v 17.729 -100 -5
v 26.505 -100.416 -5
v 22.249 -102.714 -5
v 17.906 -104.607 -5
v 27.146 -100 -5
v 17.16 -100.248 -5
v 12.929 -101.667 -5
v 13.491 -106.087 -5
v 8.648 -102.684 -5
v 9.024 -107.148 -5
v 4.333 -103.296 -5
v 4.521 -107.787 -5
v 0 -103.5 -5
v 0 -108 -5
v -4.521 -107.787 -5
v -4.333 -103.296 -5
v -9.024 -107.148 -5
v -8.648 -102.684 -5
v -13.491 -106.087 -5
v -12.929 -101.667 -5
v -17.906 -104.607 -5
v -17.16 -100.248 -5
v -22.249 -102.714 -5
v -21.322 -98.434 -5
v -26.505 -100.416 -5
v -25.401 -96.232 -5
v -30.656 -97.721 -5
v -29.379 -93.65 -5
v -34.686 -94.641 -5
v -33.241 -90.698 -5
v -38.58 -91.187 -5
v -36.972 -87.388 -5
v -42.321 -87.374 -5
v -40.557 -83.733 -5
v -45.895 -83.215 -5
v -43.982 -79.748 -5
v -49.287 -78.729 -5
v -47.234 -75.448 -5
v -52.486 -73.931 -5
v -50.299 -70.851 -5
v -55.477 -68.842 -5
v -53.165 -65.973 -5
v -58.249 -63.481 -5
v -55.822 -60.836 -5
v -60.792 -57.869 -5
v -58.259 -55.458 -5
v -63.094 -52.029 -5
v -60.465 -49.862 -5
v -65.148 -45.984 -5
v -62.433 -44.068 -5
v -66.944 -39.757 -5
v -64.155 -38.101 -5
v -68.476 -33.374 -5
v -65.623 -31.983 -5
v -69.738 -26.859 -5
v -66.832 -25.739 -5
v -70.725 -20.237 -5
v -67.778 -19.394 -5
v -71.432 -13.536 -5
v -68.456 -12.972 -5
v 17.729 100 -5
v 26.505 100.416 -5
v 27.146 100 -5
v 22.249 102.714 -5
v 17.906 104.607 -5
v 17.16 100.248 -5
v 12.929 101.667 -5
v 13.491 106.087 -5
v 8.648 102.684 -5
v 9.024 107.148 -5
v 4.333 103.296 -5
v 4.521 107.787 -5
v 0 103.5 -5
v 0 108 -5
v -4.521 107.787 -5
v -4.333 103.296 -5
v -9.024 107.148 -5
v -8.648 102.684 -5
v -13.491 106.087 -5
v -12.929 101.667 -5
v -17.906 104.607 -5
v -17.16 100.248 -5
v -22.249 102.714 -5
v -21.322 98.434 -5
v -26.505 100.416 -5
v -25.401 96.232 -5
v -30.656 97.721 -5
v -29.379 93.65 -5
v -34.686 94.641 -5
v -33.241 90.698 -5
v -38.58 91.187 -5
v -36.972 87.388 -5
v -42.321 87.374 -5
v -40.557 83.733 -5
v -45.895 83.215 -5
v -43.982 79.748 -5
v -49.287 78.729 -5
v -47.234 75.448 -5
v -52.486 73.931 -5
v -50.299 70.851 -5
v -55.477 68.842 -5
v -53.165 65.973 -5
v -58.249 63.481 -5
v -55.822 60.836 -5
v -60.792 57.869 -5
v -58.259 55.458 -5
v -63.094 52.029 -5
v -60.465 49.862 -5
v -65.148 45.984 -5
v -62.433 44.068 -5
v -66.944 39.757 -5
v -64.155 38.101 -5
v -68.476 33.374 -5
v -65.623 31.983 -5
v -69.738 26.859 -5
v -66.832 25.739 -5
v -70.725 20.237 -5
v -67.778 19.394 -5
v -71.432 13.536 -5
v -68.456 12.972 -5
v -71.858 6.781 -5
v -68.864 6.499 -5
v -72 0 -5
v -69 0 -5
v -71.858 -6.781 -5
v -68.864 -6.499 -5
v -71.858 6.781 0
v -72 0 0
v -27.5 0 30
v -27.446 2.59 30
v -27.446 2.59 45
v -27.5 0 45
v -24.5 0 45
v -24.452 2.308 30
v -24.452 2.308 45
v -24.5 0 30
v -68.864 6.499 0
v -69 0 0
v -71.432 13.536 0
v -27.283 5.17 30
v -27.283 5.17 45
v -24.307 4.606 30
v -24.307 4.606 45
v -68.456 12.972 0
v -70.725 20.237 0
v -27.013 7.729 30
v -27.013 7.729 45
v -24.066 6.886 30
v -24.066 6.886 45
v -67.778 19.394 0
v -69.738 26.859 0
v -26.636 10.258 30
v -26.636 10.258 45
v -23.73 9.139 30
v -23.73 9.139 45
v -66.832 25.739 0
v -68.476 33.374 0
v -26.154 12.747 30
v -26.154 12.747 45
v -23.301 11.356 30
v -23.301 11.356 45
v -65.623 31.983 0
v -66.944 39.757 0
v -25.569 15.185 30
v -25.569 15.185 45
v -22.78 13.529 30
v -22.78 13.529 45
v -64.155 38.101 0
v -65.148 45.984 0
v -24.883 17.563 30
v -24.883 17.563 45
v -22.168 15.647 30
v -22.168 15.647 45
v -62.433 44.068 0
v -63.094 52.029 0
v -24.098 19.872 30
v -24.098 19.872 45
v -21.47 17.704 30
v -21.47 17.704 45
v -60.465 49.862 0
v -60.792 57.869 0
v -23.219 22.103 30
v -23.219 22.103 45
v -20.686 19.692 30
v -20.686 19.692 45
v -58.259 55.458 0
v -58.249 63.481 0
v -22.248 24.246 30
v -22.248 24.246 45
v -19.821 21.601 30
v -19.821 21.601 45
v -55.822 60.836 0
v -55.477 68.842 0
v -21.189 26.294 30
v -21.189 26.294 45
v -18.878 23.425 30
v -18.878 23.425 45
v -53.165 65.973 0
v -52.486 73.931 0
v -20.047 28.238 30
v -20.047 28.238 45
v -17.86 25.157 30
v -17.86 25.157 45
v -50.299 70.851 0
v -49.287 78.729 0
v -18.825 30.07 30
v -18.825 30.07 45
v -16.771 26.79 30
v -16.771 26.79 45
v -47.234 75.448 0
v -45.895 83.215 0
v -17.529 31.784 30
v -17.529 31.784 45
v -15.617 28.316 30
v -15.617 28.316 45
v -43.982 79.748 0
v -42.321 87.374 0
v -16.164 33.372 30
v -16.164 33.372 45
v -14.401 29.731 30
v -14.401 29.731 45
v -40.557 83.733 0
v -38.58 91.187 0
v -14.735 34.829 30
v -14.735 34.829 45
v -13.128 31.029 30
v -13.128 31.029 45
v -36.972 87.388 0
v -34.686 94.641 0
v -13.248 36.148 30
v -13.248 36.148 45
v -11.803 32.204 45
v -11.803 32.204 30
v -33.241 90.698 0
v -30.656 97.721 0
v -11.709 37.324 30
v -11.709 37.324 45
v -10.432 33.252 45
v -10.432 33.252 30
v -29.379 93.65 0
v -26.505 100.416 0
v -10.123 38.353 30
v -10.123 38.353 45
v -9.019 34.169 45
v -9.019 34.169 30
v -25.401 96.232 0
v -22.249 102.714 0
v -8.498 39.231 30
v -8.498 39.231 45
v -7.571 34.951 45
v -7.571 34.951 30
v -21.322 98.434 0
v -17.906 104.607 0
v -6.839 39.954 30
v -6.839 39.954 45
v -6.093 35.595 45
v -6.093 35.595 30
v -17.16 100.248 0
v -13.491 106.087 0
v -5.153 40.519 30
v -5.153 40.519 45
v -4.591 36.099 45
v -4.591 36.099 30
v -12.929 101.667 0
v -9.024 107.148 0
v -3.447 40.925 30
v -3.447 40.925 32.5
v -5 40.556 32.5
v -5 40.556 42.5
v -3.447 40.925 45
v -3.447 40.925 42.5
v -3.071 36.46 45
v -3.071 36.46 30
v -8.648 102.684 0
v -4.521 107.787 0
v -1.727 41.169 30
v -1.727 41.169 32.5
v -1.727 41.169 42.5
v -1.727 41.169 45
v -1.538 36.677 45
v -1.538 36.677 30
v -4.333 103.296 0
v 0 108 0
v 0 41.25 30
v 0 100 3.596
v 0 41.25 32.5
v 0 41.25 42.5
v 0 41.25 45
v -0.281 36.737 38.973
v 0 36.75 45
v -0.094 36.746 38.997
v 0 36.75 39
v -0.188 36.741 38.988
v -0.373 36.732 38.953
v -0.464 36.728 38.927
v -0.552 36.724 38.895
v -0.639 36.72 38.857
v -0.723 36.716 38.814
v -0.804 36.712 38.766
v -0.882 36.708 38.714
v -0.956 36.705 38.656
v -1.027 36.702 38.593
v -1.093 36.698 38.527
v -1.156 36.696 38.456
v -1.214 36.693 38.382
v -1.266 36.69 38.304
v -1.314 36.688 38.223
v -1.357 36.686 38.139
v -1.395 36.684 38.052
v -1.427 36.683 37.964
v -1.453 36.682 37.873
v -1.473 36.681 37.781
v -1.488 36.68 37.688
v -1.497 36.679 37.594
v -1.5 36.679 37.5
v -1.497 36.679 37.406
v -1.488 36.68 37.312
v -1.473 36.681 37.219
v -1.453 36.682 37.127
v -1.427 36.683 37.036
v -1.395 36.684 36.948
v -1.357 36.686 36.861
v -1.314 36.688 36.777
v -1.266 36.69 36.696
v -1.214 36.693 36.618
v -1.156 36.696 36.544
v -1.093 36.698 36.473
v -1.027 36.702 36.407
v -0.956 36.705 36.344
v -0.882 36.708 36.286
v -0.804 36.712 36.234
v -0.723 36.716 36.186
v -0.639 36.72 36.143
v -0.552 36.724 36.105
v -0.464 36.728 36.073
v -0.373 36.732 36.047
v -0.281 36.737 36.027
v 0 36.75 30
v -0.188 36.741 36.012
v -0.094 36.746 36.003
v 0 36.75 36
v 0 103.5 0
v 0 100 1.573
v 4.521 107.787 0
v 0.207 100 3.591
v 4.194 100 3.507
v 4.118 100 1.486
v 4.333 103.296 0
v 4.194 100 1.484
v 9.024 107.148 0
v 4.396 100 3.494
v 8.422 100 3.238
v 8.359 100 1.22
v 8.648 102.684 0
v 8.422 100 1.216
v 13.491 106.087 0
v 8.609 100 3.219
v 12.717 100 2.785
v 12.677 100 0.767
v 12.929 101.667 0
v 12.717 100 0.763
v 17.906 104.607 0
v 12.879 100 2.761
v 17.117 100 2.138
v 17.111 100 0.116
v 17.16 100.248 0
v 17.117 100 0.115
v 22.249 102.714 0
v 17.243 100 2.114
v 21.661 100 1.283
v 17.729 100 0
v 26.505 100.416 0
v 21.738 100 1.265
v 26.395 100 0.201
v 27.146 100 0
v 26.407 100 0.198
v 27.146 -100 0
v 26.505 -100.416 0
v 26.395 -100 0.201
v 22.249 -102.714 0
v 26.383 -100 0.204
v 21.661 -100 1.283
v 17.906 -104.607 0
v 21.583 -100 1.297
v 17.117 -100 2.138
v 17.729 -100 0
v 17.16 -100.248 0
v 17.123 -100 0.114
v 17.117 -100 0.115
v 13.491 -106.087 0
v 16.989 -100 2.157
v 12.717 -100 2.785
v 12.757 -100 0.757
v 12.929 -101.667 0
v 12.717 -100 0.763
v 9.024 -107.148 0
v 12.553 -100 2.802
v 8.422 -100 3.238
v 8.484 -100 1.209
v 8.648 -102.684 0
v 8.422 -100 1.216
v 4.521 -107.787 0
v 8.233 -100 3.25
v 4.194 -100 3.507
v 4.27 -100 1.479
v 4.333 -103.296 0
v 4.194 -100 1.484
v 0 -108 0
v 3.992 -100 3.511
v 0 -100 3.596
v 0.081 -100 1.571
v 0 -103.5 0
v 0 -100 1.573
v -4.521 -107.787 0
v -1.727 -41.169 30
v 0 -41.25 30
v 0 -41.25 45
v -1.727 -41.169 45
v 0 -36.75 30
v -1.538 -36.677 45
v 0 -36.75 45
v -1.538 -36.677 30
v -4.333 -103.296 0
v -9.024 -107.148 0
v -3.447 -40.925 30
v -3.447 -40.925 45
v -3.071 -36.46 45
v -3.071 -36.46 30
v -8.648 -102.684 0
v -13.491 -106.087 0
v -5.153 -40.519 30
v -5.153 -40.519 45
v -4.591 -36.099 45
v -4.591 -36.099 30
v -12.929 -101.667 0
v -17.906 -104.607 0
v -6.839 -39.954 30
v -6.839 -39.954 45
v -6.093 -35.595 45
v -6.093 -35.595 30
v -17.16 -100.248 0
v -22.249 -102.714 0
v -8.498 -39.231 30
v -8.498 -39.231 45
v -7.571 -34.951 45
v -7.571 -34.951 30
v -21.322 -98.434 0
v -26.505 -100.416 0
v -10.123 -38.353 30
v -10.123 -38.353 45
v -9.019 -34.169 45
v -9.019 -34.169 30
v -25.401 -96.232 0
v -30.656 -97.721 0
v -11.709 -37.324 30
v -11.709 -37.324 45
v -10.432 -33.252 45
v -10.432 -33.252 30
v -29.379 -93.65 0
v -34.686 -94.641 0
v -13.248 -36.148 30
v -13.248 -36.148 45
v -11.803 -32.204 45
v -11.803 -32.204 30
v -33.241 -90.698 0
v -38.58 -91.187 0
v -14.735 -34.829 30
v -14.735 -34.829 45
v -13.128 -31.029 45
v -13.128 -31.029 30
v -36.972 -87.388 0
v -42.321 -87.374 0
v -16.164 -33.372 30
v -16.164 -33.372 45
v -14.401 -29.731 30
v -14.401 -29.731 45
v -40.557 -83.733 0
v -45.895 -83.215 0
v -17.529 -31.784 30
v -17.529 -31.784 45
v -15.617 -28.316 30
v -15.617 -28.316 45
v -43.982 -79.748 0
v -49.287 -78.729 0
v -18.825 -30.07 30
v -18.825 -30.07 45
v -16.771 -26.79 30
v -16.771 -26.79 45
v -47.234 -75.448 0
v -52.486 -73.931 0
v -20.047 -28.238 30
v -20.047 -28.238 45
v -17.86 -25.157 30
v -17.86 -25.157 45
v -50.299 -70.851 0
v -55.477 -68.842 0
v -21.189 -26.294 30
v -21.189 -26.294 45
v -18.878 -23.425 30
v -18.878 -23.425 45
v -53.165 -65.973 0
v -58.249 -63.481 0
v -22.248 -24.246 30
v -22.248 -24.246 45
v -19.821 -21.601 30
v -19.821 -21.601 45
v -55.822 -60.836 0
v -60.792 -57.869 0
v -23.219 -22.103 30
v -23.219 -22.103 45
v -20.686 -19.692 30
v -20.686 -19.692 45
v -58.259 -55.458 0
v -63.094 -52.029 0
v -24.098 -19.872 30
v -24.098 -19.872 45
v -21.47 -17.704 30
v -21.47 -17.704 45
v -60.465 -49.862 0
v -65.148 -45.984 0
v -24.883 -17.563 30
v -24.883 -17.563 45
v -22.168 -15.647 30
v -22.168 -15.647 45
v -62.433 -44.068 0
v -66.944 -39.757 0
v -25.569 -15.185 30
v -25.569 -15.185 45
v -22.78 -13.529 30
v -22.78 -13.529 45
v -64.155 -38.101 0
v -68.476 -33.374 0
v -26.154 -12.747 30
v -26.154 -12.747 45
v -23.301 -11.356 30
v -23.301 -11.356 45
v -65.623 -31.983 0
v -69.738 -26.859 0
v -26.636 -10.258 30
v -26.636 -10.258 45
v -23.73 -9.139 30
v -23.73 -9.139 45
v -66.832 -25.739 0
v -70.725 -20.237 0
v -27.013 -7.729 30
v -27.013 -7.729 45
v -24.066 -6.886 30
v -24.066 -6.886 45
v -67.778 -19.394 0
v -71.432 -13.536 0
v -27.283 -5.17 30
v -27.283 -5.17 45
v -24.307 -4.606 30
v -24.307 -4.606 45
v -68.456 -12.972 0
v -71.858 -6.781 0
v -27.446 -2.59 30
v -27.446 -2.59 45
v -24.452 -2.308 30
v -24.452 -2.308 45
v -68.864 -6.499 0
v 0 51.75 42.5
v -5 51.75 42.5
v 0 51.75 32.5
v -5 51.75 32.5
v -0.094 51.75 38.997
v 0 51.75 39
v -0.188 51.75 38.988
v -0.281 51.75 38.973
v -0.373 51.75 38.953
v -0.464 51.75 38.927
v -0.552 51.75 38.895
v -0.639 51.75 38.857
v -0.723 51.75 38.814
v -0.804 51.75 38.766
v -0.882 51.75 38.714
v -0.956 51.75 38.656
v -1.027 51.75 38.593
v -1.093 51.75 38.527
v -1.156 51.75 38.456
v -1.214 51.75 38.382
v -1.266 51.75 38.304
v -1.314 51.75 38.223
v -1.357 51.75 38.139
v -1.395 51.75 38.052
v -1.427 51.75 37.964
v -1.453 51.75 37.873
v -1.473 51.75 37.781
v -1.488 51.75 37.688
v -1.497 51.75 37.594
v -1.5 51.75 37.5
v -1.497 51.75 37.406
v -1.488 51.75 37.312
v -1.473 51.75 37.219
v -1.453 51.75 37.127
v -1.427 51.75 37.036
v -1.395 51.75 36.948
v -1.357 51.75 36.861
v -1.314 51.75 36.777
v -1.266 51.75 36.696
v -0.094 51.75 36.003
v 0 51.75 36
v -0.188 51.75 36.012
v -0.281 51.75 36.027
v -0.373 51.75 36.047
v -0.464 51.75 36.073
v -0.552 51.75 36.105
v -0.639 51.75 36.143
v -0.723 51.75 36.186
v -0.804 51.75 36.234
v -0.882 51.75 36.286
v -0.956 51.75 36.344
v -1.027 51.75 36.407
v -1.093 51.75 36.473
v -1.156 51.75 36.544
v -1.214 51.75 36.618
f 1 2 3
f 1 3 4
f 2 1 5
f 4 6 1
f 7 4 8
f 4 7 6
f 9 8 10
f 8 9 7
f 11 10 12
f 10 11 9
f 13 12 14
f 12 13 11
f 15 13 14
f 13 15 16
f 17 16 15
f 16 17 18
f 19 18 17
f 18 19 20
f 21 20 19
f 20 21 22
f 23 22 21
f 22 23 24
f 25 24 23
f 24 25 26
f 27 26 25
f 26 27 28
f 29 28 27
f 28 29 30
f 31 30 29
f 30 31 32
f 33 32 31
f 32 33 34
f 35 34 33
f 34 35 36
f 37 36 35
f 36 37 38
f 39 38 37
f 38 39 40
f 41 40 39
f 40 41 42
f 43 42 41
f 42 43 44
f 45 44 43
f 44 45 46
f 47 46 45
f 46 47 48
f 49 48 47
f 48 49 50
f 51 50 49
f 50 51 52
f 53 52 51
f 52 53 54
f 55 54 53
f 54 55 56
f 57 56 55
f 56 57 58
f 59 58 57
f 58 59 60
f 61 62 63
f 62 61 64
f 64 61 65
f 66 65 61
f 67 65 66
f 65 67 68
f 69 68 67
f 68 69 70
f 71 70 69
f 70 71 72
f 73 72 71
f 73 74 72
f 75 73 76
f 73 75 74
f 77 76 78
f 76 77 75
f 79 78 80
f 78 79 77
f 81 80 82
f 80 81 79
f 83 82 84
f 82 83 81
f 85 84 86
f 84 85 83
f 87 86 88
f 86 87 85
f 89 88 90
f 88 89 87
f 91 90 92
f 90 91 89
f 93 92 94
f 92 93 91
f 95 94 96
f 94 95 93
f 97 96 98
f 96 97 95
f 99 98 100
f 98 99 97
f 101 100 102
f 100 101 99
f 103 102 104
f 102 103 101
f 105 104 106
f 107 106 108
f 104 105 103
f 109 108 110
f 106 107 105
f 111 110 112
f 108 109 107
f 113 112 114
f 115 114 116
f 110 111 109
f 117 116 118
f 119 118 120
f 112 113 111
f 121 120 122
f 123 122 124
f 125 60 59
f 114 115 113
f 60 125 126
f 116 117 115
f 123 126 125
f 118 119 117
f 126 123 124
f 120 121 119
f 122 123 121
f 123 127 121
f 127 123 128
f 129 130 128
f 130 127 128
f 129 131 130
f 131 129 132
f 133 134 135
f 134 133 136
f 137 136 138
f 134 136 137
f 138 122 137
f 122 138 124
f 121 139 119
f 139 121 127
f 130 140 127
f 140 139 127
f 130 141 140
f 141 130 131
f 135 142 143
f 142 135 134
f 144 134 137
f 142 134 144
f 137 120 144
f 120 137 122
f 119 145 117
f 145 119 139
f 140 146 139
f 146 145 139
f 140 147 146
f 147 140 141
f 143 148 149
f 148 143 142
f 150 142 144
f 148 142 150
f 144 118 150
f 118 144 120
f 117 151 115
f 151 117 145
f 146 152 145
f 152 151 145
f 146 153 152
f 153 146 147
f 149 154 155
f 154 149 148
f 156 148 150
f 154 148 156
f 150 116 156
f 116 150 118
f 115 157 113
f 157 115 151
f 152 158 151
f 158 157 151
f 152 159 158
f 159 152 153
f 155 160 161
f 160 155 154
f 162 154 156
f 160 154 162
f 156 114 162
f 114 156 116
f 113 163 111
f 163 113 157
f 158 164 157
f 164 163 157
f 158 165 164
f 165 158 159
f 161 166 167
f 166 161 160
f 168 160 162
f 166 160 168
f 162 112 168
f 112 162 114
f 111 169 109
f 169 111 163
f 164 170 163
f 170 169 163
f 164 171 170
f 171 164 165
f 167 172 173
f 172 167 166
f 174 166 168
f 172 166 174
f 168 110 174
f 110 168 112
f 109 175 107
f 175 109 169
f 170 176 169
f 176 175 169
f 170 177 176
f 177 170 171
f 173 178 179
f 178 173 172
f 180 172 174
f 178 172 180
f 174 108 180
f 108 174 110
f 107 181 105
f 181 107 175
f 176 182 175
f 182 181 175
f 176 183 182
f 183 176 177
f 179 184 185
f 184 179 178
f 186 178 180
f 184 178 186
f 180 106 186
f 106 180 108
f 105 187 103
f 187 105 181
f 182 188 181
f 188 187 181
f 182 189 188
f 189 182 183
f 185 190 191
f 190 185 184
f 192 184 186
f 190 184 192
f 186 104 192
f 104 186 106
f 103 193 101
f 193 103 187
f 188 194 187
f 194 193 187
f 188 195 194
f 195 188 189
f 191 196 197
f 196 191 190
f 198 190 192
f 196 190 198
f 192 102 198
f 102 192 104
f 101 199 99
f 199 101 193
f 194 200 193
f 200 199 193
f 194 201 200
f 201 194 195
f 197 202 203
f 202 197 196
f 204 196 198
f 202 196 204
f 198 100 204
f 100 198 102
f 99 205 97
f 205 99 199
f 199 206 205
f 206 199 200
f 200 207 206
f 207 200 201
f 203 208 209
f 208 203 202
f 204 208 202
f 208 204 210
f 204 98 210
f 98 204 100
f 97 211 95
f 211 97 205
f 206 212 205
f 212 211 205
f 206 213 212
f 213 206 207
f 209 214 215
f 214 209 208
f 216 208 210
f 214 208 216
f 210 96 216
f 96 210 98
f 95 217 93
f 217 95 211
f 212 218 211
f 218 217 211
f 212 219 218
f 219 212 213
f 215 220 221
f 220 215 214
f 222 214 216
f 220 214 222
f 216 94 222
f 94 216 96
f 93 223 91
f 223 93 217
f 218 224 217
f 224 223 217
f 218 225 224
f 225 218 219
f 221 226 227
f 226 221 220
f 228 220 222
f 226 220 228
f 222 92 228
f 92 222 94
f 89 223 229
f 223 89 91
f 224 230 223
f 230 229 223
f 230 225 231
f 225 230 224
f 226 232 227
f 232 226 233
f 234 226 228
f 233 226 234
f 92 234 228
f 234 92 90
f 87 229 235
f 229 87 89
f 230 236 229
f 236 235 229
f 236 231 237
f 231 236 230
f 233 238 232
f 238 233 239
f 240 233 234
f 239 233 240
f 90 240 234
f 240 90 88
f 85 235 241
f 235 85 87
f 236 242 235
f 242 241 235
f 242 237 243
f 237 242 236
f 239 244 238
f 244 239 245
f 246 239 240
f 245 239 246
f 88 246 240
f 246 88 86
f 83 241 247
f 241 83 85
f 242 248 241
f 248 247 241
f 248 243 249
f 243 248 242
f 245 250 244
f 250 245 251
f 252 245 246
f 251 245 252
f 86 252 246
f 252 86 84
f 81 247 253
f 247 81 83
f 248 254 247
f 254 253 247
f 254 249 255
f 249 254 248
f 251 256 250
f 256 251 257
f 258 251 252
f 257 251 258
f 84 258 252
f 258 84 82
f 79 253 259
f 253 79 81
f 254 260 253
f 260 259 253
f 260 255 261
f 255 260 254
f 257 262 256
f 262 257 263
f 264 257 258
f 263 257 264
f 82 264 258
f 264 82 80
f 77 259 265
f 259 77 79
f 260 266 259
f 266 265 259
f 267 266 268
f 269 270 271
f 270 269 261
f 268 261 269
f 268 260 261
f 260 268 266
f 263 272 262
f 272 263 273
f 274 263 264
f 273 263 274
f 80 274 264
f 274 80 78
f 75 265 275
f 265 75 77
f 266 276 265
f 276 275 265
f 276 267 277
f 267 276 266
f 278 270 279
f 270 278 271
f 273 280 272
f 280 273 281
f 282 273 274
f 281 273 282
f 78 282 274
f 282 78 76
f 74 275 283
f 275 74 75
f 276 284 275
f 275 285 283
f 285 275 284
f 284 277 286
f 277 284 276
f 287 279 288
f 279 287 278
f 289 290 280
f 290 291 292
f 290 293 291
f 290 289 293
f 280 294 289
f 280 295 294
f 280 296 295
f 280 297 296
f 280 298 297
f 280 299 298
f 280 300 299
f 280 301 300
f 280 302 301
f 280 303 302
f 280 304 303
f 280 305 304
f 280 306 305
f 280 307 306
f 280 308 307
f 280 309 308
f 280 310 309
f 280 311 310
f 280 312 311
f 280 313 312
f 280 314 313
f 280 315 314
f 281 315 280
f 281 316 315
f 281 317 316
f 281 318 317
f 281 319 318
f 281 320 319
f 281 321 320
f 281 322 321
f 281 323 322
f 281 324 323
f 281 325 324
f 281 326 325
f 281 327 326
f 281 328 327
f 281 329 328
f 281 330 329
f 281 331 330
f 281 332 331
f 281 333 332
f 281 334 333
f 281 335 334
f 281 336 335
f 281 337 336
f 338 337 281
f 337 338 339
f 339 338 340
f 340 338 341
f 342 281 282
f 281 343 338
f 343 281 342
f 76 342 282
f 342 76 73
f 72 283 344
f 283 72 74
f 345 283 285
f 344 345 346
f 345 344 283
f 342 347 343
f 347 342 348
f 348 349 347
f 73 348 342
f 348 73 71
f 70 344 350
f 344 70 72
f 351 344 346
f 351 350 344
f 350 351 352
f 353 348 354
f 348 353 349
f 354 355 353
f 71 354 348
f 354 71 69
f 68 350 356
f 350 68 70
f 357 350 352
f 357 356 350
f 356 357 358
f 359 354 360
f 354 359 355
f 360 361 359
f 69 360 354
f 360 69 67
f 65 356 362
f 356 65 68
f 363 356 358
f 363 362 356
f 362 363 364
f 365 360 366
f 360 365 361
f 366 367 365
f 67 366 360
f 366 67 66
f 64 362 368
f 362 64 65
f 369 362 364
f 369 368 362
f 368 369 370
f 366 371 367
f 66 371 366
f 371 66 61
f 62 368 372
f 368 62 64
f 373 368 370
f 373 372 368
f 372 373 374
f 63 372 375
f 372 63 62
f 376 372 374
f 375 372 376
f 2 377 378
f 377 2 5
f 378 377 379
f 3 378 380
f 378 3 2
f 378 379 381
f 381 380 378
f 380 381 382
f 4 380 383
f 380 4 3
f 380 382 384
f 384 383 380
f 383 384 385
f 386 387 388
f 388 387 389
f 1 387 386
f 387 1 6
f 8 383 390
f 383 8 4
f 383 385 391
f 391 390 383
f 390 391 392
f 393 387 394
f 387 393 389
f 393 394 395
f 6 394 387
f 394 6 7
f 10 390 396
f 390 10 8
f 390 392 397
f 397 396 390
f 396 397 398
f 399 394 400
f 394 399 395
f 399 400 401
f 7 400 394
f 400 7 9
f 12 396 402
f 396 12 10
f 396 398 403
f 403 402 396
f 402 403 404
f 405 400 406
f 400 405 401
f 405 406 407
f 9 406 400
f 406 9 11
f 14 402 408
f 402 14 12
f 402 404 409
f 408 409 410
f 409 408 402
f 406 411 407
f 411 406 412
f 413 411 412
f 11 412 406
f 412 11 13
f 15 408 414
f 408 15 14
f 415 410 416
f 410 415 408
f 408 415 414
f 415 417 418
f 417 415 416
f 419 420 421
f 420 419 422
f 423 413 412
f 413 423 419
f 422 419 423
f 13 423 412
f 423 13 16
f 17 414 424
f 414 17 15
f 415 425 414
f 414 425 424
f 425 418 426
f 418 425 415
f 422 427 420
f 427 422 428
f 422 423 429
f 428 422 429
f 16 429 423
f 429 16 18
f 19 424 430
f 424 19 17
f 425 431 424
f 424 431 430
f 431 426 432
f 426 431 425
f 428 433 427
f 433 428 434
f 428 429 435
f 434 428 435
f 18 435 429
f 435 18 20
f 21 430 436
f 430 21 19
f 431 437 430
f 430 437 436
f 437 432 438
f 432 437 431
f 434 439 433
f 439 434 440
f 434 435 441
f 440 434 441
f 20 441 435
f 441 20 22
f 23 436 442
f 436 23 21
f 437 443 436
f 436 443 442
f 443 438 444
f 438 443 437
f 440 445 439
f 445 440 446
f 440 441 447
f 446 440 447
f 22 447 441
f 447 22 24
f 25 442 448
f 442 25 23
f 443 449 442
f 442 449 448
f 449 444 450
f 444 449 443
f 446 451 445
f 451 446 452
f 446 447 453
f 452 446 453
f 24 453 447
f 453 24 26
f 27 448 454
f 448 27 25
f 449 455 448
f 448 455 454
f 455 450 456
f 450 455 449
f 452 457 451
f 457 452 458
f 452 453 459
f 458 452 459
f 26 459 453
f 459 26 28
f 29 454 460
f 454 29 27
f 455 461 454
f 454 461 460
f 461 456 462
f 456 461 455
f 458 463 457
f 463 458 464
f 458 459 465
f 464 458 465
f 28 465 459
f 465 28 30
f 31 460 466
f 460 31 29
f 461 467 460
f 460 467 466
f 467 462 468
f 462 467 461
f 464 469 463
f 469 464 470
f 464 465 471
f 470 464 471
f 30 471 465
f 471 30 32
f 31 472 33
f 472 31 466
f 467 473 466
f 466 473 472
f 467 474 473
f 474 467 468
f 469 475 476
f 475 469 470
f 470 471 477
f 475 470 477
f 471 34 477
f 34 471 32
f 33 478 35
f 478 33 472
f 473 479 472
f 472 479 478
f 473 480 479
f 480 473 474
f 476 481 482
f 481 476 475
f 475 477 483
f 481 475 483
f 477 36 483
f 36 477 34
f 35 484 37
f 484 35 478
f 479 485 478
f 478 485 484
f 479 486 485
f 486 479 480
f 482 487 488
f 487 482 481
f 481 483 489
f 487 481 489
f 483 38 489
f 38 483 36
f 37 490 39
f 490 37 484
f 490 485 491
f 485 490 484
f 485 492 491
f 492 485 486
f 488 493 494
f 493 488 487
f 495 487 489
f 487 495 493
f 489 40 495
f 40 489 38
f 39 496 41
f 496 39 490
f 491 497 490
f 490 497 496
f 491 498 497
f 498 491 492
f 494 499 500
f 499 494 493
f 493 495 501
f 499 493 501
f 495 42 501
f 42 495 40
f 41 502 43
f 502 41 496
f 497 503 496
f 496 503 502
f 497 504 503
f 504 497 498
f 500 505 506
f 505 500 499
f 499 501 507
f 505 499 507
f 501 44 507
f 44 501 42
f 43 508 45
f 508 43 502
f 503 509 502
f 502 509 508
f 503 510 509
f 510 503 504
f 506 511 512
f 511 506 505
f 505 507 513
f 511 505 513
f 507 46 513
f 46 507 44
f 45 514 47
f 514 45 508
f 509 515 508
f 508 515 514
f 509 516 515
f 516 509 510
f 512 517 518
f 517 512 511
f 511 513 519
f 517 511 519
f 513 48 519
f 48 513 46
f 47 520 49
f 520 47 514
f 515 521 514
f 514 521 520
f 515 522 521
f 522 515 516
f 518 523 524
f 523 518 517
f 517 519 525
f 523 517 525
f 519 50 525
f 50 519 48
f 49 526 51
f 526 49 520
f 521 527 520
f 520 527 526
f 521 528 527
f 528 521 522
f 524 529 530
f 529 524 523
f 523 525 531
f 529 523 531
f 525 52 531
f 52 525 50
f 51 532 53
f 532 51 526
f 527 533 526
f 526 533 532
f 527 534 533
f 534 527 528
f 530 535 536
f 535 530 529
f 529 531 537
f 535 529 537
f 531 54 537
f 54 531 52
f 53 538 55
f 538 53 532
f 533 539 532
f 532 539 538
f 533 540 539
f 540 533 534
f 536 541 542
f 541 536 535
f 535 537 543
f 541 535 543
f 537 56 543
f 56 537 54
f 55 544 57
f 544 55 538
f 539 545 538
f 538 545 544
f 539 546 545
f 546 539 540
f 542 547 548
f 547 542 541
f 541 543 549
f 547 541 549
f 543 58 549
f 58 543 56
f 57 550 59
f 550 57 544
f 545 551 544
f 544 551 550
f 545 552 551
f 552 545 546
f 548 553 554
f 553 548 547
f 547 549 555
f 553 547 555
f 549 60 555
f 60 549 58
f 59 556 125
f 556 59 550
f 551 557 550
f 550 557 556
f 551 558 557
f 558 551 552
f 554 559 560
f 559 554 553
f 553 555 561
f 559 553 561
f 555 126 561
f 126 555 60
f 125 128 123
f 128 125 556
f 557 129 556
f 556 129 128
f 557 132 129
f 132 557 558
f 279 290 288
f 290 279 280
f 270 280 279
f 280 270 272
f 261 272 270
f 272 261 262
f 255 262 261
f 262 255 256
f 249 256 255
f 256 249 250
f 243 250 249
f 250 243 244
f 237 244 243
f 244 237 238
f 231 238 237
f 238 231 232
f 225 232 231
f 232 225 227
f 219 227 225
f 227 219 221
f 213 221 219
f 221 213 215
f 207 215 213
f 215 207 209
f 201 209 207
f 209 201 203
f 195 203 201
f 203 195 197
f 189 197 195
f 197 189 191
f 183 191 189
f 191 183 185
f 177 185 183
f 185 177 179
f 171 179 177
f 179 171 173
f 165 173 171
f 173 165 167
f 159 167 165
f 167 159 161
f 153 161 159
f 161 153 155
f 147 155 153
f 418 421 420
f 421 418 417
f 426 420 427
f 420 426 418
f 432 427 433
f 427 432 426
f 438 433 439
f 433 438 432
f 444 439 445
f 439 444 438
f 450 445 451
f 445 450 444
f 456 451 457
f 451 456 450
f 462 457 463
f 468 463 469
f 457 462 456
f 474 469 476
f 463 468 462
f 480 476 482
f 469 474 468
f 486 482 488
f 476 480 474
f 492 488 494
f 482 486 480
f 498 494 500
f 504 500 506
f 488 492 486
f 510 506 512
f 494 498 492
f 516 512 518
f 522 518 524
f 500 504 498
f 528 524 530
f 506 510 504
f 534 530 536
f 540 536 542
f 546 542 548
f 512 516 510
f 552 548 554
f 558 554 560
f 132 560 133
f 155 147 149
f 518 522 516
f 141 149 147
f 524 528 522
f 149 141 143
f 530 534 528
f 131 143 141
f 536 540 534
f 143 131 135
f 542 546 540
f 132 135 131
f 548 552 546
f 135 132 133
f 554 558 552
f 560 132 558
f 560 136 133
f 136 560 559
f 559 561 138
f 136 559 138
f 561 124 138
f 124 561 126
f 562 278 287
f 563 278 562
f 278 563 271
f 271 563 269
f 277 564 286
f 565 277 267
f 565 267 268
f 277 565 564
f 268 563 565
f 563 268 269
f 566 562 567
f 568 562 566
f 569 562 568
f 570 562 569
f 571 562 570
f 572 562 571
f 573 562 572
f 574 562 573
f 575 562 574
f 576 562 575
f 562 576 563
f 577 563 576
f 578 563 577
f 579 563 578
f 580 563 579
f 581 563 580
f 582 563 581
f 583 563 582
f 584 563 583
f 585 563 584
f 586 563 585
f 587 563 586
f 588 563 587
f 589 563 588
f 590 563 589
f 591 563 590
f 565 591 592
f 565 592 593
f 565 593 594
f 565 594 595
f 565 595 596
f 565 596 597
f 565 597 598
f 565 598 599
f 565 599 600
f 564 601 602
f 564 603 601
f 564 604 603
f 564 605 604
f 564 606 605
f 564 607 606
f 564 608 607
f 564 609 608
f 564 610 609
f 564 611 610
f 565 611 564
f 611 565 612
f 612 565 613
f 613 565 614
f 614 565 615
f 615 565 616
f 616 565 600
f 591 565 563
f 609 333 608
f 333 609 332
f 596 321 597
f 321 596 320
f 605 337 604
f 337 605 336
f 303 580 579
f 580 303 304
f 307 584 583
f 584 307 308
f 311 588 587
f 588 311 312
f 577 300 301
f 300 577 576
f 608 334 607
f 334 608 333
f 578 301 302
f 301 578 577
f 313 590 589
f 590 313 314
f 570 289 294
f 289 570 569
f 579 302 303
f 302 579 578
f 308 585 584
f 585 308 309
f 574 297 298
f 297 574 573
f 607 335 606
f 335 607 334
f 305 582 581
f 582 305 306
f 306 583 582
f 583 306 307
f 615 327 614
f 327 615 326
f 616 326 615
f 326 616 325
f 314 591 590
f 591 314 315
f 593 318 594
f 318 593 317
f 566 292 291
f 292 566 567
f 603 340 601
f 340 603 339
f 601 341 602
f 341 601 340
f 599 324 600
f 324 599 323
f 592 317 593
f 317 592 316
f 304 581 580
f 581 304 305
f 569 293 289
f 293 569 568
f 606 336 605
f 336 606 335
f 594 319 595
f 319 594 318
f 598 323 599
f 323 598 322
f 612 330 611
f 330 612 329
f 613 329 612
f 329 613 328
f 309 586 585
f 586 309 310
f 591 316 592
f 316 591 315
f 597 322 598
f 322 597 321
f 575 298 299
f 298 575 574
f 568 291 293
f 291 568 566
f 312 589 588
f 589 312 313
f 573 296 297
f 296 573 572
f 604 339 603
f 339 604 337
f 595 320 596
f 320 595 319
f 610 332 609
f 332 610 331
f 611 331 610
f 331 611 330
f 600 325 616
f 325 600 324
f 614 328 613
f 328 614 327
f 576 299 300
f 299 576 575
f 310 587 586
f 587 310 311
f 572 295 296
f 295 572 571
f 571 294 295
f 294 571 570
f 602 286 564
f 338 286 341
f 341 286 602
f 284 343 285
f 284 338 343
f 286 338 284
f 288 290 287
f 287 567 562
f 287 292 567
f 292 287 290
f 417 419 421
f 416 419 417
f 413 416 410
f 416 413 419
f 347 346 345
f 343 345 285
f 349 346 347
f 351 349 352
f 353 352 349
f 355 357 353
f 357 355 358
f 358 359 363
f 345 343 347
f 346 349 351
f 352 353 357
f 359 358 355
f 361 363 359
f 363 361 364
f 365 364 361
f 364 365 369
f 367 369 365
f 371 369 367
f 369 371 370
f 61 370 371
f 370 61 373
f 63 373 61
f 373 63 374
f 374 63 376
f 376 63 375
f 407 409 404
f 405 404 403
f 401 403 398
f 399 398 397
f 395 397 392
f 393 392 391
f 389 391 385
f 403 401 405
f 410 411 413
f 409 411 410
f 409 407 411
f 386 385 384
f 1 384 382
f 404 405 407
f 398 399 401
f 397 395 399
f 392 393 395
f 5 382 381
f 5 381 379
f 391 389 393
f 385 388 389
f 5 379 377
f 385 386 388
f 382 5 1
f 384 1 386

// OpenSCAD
$fn = $preview ? 100 : 100; // Разрешение модели

module move(x=0,y=0,z=0,rx=0,ry=0,rz=0) // Модуль перемещения
{translate([x,y,z]) rotate([rx,ry,rz]) children();}


difference() {
scale([1,1.5,1]) voronka();
move(y=-100, z=-10) cube(200);
}





d1=150;
d2=55;
th=3;
h=30;
h2=15;



module voronka(){

difference() {
union() {
rotate_extrude(angle=360, convexity=10)  {
move(x=d2/2-th) polygon([[0,h],[th,h],[(d1-d2)/2,0],[(d1-d2)/2-th,0]], convexity = 10);
move(x=d2/2-th, y=h) polygon([[0,0],[th,0],[th,h2],[0,h2]], convexity = 10);
move(x=d1/2-2*th, y=-5) polygon([[0,0],[th,0],[th,5],[0,5]], convexity = 10);
}
move(x=-5, y=d2/2-th, z=h+h2/2-5) cube(10);
}

  move(y=d2/2+10, z=h+h2/2) move(rx=90) cylinder(h = 20, d = 3);
}
}
